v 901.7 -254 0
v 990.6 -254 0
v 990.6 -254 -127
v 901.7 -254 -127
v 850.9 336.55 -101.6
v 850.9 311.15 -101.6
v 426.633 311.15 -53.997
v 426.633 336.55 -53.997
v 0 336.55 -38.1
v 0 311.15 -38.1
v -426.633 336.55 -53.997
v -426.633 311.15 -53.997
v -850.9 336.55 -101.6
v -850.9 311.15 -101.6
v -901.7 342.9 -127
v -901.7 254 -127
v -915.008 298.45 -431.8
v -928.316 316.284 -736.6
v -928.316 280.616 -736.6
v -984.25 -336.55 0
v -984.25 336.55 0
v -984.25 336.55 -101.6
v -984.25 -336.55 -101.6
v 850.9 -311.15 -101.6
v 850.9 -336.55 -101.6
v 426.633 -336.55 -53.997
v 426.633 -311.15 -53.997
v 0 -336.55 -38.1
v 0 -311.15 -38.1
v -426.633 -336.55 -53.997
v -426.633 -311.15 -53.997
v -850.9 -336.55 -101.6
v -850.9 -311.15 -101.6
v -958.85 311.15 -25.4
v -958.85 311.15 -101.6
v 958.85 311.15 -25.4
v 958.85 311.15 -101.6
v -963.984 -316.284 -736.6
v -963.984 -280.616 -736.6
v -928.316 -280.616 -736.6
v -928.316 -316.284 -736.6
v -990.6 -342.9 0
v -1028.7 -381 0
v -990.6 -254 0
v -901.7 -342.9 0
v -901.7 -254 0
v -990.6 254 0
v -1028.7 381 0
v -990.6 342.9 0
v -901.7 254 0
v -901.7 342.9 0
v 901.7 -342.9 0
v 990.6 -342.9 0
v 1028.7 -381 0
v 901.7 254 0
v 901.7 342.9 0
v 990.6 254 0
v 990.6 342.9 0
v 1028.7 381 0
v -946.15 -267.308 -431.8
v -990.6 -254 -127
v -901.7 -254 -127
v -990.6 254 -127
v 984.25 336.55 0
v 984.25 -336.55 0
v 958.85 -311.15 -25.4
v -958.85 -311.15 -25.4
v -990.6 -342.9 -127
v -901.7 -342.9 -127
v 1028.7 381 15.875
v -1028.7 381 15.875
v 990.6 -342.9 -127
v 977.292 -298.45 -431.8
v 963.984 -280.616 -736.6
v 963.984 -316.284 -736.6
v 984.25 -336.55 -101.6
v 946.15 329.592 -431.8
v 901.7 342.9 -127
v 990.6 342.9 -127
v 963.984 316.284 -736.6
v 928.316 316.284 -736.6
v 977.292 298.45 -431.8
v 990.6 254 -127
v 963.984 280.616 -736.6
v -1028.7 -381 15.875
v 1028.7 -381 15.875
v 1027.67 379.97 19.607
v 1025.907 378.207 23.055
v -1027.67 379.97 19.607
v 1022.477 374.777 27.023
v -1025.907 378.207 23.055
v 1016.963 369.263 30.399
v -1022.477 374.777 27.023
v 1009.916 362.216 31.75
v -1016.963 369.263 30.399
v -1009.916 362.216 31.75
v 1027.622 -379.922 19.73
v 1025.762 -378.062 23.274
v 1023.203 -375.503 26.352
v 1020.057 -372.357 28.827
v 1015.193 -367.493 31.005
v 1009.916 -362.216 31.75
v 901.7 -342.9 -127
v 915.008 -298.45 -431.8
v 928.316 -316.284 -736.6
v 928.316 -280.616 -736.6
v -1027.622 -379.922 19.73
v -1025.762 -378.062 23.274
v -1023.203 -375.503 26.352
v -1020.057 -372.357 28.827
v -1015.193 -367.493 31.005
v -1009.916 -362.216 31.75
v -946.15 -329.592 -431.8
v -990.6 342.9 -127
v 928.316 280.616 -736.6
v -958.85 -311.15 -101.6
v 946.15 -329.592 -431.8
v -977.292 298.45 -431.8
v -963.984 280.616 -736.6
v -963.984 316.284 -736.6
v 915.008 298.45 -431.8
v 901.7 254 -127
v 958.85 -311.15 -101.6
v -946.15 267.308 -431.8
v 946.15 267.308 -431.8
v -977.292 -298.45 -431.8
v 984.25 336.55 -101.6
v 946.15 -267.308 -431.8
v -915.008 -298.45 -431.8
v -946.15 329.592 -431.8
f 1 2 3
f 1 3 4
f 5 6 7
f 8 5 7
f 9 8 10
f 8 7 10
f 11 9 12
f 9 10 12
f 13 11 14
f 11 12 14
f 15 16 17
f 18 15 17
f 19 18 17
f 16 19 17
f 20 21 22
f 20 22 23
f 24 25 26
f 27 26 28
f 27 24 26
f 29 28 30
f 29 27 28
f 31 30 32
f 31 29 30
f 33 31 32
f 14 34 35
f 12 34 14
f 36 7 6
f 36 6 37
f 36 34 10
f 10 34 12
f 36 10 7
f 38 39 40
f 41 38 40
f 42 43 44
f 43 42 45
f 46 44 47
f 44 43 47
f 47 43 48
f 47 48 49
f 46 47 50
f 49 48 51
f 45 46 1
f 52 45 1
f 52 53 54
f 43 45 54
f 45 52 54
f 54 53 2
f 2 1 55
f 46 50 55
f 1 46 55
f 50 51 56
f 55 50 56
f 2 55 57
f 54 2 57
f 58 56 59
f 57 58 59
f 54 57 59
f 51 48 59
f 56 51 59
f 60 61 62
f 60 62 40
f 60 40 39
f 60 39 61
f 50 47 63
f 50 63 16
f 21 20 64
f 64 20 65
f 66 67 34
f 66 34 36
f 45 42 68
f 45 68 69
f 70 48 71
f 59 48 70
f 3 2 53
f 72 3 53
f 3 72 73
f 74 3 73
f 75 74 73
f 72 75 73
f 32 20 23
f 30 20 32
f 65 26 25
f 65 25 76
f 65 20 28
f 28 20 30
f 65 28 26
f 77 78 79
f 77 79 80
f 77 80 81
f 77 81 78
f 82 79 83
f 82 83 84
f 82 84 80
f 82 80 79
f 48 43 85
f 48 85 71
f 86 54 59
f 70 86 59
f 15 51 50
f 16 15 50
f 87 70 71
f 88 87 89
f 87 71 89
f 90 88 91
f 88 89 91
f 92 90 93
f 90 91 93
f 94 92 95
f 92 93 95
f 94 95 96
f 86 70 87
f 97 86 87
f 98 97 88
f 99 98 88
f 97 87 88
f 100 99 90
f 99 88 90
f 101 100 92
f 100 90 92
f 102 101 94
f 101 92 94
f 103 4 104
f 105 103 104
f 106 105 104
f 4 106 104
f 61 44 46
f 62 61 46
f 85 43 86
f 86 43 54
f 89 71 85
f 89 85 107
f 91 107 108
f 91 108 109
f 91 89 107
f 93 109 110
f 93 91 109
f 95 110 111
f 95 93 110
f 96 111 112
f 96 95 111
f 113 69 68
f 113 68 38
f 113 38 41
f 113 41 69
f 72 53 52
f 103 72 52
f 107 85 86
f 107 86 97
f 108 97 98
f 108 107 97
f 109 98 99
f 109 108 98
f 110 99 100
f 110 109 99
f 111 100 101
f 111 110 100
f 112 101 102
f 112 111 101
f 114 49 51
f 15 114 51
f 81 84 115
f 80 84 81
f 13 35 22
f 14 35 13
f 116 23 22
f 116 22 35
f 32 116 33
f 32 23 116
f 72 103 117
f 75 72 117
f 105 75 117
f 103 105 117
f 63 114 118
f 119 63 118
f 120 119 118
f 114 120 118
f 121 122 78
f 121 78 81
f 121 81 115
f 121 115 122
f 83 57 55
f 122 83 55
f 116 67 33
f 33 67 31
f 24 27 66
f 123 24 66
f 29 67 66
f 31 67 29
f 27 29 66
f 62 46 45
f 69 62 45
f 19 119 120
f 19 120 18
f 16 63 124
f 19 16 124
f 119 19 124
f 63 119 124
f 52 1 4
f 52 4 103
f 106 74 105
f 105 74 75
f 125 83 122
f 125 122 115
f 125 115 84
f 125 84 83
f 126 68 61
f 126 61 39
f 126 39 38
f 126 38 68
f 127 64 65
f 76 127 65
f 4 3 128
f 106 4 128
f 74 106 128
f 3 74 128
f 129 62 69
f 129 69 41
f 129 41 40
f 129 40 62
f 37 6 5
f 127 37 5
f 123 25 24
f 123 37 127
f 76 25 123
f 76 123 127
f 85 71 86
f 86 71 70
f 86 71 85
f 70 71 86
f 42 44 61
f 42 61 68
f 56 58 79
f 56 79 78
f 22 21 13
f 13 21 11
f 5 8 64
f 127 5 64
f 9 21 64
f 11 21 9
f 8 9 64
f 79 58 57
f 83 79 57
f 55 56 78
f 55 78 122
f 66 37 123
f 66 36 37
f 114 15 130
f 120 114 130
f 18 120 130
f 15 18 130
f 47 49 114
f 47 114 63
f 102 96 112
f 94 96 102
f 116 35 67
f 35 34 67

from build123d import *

# Parameters (mm, degrees)
F0_W           = 2057.4
F0_H           = 762
F1_DEPTH       = 15.875
F2_W           = 2057.4
F2_H           = 762
F3_DEPTH       = 15.875
F4_T1_DEPTH    = 2151.3177665567
F4_T3_DEPTH    = 855.9177665567
F6_W           = 88.9
F6_H           = 88.9
F7_DEPTH       = 127
F9_W           = 1968.5
F9_H           = 673.1
F10_DEPTH      = 101.6
F11_T          = -25.4
F12_W          = 88.9
F12_H          = 88.9
F13_DEPTH      = 609.6
F13_TAPER      = 2.5
F16_W          = 1701.8
F16_H          = 245.2263149261
F17_DEPTH      = 914.4
F17_DEPTH_BACK = 914.4


# Not quite as in the source:
# - a fillet or chamfer that OpenCascade refuses, or shapes differently, is made with other operations: its cross-section is extruded or revolved along the edge and cut away or added


with BuildPart() as f1:
    # F0 (on Top) → F1 (new body)
    with BuildSketch(Plane.XY):
        Rectangle(F0_W, F0_H)
    extrude(amount=F1_DEPTH)

    # F6 (on face) → F7 (join)
    with BuildSketch(Plane(origin=(0, 0, 0), x_dir=(1, 0, 0), z_dir=(0, 0, -1))):
        with Locations((-946.15, 298.45)):
            Rectangle(F6_W, F6_H)
        with Locations((-946.15, -298.45)):
            Rectangle(F6_W, F6_H)
    extrude(amount=F7_DEPTH)

    # F8: F1 across plane


with BuildPart() as f3:
    # F2 (on face) → F3 (new body)
    with BuildSketch(Plane.XY.offset(15.875)):
        Rectangle(F2_W, F2_H)
    extrude(amount=F3_DEPTH)

    # F4: fillet of radius 19.05 on 4 edges, made by hand

    # F4_s2 → F4_t1 (cut)
    with BuildSketch(Plane.YZ.offset(-1075.6588832784)):
        with BuildLine():
            ThreePointArc((-381, 15.875), (-374.5131688129, 27.2496778315), (-362.2164466887, 31.75))
            Line((-362.2164466887, 31.75), (-381, 31.75))
            Line((-381, 31.75), (-381, 15.875))
        make_face()
        with BuildLine():
            ThreePointArc((381, 15.875), (374.5131688129, 27.2496778315), (362.2164466887, 31.75))
            Line((362.2164466887, 31.75), (381, 31.75))
            Line((381, 31.75), (381, 15.875))
        make_face()
    extrude(amount=F4_T1_DEPTH, mode=Mode.SUBTRACT)

    # F4_s4 → F4_t3 (cut)
    with BuildSketch(Plane.XZ.offset(-427.9588832784)):
        with BuildLine():
            ThreePointArc((-1028.7, 15.875), (-1022.2131688129, 27.2496778315), (-1009.9164466887, 31.75))
            Line((-1009.9164466887, 31.75), (-1028.7, 31.75))
            Line((-1028.7, 31.75), (-1028.7, 15.875))
        make_face()
        with BuildLine():
            ThreePointArc((1028.7, 15.875), (1022.2131688129, 27.2496778315), (1009.9164466887, 31.75))
            Line((1009.9164466887, 31.75), (1028.7, 31.75))
            Line((1028.7, 31.75), (1028.7, 15.875))
        make_face()
    extrude(amount=F4_T3_DEPTH, mode=Mode.SUBTRACT)


with BuildPart() as f1_1:
    add(f1.part)
    add(f1.part.mirror(Plane.YZ))

    # F12 (on face) → F13 (join)
    with BuildSketch(Plane(origin=(0, 0, -127), x_dir=(1, 0, 0), z_dir=(0, 0, -1))):
        with Locations((-946.15, 298.45)):
            Rectangle(F12_W, F12_H)
    extrude(amount=F13_DEPTH, taper=F13_TAPER)


with BuildPart() as f10:
    # F9 (on face) → F10 (new body)
    with BuildSketch(Plane(origin=(0, 0, 0), x_dir=(1, 0, 0), z_dir=(0, 0, -1))):
        Rectangle(F9_W, F9_H)
    extrude(amount=F10_DEPTH)

    # F11
    f11_openings = [f10.faces().sort_by_distance(p)[0] for p in [
        (0, 0, -101.6),
    ]]
    offset(amount=F11_T, openings=f11_openings)

    # F16 (on Front) → F17 (cut, two sides)
    with BuildSketch(Plane.XZ) as f17_sk:
        with BuildLine():
            Line((-850.9, -101.6), (850.9, -101.6))
            ThreePointArc((850.9, -101.6), (0, -38.1), (-850.9, -101.6))
        make_face()
        with Locations((0, -224.2131574631)):
            Rectangle(F16_W, F16_H)
    extrude(amount=F17_DEPTH, mode=Mode.SUBTRACT)
    extrude(f17_sk.sketch, amount=-F17_DEPTH_BACK, mode=Mode.SUBTRACT)


with BuildPart() as f14_1:
    # F14: instance of F1
    add(f1_1.part.mirror(Plane.XZ))


with BuildPart() as f1_2:
    add(f1_1.part)

    add(f14_1.part)  # F15 merges F14_1
    # F15: F1, F14_1 across plane
    add(f1_1.part.mirror(Plane.YZ))
    add(f14_1.part.mirror(Plane.YZ))


solid = Compound([f3.part, f10.part, f1_2.part])
